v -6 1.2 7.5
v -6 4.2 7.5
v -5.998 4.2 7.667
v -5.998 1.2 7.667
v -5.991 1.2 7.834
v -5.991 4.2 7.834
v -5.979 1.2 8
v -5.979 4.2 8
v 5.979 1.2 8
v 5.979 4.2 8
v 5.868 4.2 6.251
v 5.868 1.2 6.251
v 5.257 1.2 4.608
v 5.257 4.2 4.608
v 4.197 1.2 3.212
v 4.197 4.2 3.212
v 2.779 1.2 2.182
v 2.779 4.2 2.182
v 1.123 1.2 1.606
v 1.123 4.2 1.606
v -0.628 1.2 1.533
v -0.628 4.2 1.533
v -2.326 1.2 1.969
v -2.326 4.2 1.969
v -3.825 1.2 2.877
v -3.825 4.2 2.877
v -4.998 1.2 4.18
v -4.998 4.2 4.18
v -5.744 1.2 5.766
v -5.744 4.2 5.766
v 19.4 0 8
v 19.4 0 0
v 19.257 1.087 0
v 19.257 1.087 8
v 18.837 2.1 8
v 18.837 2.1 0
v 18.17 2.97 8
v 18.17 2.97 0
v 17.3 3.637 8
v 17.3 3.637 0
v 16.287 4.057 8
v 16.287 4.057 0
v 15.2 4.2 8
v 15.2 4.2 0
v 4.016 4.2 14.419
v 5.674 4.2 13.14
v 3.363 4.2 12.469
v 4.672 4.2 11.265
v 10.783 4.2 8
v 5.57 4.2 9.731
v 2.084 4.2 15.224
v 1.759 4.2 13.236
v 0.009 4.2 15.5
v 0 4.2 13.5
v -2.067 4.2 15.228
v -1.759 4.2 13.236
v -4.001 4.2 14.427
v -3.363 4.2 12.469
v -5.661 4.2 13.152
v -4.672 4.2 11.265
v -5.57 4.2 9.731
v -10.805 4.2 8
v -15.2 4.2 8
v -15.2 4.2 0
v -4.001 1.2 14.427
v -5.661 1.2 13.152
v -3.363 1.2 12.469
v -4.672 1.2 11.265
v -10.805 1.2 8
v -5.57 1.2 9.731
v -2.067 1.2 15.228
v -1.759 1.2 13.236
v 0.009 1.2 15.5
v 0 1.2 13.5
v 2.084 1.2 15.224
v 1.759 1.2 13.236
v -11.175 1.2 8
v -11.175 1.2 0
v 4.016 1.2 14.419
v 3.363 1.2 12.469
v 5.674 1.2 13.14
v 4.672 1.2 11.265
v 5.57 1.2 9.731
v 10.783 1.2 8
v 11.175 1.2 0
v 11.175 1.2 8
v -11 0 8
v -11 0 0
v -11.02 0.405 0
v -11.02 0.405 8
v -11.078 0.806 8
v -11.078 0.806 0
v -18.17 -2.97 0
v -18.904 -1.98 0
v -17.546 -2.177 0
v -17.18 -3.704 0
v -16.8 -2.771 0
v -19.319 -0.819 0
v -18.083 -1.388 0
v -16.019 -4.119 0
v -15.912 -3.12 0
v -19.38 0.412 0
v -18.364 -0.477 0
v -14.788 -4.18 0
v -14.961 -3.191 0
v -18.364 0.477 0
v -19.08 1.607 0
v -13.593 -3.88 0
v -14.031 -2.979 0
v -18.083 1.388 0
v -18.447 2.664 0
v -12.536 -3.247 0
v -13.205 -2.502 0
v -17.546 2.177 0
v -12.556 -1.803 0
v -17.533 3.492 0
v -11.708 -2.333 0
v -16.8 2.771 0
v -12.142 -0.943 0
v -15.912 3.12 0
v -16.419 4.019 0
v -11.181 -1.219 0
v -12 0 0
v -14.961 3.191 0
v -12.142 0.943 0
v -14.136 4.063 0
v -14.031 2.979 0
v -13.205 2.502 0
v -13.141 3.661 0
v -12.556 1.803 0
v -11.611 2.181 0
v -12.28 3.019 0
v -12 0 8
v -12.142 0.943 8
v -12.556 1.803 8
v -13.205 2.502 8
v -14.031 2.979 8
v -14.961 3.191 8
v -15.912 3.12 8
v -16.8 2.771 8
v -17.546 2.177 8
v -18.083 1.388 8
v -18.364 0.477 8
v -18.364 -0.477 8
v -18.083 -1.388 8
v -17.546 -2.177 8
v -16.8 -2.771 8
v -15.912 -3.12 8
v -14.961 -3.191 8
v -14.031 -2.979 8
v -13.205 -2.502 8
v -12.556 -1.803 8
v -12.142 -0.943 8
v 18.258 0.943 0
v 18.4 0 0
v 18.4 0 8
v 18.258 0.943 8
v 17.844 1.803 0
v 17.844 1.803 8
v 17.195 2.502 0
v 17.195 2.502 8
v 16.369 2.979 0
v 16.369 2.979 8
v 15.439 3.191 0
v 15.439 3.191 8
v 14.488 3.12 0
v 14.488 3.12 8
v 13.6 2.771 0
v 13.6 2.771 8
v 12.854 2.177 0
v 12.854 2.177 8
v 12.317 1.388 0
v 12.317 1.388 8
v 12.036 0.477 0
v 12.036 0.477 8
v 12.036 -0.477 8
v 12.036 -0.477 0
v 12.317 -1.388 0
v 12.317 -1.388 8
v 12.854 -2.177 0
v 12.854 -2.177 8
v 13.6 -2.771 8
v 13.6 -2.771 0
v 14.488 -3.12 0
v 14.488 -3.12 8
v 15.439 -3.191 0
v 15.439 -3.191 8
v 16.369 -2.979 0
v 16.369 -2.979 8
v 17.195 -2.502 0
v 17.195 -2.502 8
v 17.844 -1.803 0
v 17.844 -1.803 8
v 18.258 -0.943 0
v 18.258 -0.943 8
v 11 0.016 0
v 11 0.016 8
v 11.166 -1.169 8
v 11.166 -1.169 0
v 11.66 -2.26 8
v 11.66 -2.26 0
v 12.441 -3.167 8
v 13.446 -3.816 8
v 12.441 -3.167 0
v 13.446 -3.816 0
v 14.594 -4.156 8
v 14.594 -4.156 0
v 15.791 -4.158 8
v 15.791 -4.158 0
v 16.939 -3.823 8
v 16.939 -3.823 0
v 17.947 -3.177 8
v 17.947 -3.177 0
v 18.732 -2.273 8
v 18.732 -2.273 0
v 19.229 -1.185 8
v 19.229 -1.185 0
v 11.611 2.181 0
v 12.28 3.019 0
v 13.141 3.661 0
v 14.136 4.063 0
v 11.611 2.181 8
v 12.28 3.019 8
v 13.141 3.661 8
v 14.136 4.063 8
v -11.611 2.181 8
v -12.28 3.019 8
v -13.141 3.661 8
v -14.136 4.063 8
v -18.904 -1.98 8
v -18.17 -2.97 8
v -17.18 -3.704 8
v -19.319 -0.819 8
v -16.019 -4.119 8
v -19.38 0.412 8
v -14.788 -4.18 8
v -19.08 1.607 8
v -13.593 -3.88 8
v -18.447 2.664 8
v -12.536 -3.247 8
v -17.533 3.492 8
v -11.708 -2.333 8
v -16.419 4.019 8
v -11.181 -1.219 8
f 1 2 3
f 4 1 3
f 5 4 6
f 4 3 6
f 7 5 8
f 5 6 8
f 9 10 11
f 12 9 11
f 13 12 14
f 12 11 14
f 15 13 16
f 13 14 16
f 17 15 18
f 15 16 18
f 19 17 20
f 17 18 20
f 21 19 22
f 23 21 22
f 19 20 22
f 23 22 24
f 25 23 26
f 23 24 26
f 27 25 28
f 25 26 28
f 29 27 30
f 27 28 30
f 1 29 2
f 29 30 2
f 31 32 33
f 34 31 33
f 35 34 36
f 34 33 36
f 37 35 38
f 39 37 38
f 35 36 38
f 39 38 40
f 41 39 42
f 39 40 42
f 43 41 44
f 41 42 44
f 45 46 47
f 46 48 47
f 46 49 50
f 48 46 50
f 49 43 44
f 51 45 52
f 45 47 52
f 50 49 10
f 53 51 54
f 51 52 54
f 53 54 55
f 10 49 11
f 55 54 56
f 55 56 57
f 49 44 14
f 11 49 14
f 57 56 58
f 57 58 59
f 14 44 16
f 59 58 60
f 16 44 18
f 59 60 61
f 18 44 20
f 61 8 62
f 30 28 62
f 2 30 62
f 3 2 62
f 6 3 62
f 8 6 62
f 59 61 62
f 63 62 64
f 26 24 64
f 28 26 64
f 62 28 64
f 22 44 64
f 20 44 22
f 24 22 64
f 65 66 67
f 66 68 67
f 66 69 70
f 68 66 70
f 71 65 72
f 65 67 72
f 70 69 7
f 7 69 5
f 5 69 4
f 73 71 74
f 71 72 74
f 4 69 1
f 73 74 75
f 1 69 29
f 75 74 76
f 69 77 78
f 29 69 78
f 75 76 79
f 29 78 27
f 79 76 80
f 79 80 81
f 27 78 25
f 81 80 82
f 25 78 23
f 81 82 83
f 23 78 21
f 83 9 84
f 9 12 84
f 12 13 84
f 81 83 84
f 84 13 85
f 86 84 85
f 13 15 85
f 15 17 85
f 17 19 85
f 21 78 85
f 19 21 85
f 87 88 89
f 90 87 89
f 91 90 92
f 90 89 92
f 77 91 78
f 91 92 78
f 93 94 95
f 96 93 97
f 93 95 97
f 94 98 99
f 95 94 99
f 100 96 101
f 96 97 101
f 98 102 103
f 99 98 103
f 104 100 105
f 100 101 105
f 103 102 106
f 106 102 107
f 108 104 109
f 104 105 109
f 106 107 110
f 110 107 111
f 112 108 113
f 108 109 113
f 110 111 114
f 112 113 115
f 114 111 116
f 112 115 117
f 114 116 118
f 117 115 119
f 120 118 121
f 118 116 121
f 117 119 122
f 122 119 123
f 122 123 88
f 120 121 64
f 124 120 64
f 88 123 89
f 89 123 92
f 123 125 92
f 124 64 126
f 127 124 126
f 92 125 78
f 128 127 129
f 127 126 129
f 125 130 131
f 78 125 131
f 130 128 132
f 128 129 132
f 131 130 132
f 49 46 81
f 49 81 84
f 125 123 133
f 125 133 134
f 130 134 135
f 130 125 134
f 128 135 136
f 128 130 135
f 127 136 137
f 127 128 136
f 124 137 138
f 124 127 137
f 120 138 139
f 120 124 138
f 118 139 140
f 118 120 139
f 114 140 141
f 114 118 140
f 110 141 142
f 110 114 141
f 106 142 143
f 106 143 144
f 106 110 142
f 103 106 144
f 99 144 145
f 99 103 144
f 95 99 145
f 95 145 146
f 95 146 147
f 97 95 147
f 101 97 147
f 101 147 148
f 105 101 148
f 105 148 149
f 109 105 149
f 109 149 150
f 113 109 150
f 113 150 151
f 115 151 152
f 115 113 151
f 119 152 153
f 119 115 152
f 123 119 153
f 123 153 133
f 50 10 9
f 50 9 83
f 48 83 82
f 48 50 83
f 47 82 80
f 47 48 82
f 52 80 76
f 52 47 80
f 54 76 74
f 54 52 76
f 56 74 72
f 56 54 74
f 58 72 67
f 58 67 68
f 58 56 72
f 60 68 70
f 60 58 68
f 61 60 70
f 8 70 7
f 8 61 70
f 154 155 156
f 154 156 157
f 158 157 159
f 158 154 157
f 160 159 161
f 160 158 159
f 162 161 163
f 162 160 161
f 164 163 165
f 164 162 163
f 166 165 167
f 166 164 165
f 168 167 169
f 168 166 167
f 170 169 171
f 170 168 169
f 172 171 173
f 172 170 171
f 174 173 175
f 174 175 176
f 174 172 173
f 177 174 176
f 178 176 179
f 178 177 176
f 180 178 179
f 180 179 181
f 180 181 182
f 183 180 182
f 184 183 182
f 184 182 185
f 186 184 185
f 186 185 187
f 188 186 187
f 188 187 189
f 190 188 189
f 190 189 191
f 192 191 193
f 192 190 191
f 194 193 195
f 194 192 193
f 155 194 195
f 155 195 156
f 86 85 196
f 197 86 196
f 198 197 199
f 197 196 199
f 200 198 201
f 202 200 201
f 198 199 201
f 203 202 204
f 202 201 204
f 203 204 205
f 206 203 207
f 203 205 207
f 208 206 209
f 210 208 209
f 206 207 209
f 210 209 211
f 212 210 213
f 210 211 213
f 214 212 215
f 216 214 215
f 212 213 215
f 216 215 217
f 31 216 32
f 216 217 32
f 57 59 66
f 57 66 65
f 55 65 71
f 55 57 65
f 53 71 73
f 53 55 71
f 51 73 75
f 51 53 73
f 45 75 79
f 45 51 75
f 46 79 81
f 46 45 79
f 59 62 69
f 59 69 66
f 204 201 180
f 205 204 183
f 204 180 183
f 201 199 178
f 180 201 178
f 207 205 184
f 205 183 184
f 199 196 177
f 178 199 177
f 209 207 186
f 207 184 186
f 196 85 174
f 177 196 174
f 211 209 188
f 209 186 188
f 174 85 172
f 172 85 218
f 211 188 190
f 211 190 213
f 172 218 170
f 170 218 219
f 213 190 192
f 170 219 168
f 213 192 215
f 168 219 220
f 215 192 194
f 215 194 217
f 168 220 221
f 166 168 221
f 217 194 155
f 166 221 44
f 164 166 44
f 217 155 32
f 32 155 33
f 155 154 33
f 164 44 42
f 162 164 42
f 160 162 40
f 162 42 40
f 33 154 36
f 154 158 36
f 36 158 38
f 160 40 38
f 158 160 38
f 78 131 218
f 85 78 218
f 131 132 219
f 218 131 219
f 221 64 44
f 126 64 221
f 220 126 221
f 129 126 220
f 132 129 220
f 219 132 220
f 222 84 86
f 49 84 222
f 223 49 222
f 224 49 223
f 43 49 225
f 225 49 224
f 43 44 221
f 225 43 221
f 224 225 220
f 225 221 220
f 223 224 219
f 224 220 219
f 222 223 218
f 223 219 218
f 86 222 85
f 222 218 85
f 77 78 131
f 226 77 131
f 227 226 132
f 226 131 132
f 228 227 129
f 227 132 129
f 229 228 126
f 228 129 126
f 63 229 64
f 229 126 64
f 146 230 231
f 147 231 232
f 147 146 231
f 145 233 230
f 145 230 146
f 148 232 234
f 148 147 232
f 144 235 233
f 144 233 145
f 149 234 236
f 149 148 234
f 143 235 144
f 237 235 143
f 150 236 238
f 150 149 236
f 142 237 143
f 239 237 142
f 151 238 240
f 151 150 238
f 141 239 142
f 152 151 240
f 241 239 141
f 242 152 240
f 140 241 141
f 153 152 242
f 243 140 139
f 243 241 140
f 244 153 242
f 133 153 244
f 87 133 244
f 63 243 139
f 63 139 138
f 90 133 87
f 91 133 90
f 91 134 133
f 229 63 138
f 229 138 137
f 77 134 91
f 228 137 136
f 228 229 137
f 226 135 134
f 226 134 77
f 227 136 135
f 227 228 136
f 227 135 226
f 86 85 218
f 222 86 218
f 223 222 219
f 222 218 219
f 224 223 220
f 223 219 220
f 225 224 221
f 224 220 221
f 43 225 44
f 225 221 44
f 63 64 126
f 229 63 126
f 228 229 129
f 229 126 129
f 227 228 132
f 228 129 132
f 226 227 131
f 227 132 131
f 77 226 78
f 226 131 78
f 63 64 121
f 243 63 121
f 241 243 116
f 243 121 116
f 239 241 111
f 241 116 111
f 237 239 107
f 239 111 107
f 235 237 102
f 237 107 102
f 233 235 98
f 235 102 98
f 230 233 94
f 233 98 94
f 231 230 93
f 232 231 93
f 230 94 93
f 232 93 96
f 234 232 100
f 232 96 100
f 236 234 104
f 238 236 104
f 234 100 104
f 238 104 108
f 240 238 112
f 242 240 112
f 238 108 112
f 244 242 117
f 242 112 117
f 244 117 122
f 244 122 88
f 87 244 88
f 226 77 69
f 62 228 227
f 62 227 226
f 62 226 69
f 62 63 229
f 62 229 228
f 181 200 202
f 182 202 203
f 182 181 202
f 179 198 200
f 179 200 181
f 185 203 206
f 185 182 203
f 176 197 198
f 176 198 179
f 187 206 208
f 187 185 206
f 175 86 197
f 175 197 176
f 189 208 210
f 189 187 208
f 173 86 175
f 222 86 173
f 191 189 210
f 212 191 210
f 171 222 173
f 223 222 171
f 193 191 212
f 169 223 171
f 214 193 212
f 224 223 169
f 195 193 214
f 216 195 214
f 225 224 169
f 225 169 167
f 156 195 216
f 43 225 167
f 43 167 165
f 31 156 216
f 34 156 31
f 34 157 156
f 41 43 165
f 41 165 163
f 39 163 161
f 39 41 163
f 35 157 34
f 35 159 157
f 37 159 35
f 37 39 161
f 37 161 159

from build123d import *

# Parameters (mm, degrees)
F0_R     = 3.2
F1_DEPTH = 8
F2_DEPTH = 8
F4_DEPTH = 3
F5_DEPTH = 3


with BuildPart() as f1:
    # F0 (on Top) → F1 (new body)
    with BuildSketch(Plane.XY):
        with BuildLine():
            ThreePointArc((-11.175078, 1.2), (-12.69002, 3.367492), (-15.2, 4.2))
            ThreePointArc((-15.2, 4.2), (-18.169848, -2.969848), (-11, 0))
            ThreePointArc((-11, 0), (-11.044, 0.606352), (-11.175078, 1.2))
        make_face()
        with Locations((-15.2, 0)):
            Circle(F0_R, mode=Mode.SUBTRACT)
        with BuildLine():
            ThreePointArc((19.4, 0), (18.169848, 2.969848), (15.2, 4.2))
            ThreePointArc((15.2, 4.2), (12.69002, 3.367492), (11.175078, 1.2))
            ThreePointArc((11.175078, 1.2), (14.593648, -4.156), (19.4, 0))
        make_face()
        with Locations((15.2, 0)):
            Circle(F0_R, mode=Mode.SUBTRACT)
    extrude(amount=F1_DEPTH)


with BuildPart() as f2:
    # F0 (on Top) → F2 (new body)
    with BuildSketch(Plane.XY):
        with BuildLine():
            ThreePointArc((11.175078, 1.2), (12.69002, 3.367492), (15.2, 4.2))
            Line((15.2, 4.2), (-15.2, 4.2))
            ThreePointArc((-15.2, 4.2), (-12.69002, 3.367492), (-11.175078, 1.2))
            Line((-11.175078, 1.2), (11.175078, 1.2))
        make_face()
    extrude(amount=F2_DEPTH)

    # F3 (on face) → F4 (join)
    with BuildSketch(Plane(origin=(0, 4.2, 0), x_dir=(-1, 0, 0), z_dir=(0, 1, 0))):
        with BuildLine():
            ThreePointArc((-5.97913, 8), (0, 13.5), (5.97913, 8))
            Line((5.97913, 8), (10.805306, 8))
            Line((10.805306, 8), (5.661467, 13.152238))
            ThreePointArc((5.661467, 13.152238), (-0.008701, 15.499995), (-5.673748, 13.139909))
            Line((-5.673748, 13.139909), (-10.783003, 8))
            Line((-10.783003, 8), (-5.97913, 8))
        make_face()
    extrude(amount=-F4_DEPTH)

    # F3 (on face) → F5 (cut)
    with BuildSketch(Plane(origin=(0, 4.2, 0), x_dir=(-1, 0, 0), z_dir=(0, 1, 0))):
        with BuildLine():
            ThreePointArc((-5.97913, 8), (-0.250218, 1.50522), (6, 7.5))
            ThreePointArc((6, 7.5), (5.99478, 7.750218), (5.97913, 8))
            Line((5.97913, 8), (-5.97913, 8))
        make_face()
    extrude(amount=-F5_DEPTH, mode=Mode.SUBTRACT)


solid = Compound([f1.part, f2.part])
